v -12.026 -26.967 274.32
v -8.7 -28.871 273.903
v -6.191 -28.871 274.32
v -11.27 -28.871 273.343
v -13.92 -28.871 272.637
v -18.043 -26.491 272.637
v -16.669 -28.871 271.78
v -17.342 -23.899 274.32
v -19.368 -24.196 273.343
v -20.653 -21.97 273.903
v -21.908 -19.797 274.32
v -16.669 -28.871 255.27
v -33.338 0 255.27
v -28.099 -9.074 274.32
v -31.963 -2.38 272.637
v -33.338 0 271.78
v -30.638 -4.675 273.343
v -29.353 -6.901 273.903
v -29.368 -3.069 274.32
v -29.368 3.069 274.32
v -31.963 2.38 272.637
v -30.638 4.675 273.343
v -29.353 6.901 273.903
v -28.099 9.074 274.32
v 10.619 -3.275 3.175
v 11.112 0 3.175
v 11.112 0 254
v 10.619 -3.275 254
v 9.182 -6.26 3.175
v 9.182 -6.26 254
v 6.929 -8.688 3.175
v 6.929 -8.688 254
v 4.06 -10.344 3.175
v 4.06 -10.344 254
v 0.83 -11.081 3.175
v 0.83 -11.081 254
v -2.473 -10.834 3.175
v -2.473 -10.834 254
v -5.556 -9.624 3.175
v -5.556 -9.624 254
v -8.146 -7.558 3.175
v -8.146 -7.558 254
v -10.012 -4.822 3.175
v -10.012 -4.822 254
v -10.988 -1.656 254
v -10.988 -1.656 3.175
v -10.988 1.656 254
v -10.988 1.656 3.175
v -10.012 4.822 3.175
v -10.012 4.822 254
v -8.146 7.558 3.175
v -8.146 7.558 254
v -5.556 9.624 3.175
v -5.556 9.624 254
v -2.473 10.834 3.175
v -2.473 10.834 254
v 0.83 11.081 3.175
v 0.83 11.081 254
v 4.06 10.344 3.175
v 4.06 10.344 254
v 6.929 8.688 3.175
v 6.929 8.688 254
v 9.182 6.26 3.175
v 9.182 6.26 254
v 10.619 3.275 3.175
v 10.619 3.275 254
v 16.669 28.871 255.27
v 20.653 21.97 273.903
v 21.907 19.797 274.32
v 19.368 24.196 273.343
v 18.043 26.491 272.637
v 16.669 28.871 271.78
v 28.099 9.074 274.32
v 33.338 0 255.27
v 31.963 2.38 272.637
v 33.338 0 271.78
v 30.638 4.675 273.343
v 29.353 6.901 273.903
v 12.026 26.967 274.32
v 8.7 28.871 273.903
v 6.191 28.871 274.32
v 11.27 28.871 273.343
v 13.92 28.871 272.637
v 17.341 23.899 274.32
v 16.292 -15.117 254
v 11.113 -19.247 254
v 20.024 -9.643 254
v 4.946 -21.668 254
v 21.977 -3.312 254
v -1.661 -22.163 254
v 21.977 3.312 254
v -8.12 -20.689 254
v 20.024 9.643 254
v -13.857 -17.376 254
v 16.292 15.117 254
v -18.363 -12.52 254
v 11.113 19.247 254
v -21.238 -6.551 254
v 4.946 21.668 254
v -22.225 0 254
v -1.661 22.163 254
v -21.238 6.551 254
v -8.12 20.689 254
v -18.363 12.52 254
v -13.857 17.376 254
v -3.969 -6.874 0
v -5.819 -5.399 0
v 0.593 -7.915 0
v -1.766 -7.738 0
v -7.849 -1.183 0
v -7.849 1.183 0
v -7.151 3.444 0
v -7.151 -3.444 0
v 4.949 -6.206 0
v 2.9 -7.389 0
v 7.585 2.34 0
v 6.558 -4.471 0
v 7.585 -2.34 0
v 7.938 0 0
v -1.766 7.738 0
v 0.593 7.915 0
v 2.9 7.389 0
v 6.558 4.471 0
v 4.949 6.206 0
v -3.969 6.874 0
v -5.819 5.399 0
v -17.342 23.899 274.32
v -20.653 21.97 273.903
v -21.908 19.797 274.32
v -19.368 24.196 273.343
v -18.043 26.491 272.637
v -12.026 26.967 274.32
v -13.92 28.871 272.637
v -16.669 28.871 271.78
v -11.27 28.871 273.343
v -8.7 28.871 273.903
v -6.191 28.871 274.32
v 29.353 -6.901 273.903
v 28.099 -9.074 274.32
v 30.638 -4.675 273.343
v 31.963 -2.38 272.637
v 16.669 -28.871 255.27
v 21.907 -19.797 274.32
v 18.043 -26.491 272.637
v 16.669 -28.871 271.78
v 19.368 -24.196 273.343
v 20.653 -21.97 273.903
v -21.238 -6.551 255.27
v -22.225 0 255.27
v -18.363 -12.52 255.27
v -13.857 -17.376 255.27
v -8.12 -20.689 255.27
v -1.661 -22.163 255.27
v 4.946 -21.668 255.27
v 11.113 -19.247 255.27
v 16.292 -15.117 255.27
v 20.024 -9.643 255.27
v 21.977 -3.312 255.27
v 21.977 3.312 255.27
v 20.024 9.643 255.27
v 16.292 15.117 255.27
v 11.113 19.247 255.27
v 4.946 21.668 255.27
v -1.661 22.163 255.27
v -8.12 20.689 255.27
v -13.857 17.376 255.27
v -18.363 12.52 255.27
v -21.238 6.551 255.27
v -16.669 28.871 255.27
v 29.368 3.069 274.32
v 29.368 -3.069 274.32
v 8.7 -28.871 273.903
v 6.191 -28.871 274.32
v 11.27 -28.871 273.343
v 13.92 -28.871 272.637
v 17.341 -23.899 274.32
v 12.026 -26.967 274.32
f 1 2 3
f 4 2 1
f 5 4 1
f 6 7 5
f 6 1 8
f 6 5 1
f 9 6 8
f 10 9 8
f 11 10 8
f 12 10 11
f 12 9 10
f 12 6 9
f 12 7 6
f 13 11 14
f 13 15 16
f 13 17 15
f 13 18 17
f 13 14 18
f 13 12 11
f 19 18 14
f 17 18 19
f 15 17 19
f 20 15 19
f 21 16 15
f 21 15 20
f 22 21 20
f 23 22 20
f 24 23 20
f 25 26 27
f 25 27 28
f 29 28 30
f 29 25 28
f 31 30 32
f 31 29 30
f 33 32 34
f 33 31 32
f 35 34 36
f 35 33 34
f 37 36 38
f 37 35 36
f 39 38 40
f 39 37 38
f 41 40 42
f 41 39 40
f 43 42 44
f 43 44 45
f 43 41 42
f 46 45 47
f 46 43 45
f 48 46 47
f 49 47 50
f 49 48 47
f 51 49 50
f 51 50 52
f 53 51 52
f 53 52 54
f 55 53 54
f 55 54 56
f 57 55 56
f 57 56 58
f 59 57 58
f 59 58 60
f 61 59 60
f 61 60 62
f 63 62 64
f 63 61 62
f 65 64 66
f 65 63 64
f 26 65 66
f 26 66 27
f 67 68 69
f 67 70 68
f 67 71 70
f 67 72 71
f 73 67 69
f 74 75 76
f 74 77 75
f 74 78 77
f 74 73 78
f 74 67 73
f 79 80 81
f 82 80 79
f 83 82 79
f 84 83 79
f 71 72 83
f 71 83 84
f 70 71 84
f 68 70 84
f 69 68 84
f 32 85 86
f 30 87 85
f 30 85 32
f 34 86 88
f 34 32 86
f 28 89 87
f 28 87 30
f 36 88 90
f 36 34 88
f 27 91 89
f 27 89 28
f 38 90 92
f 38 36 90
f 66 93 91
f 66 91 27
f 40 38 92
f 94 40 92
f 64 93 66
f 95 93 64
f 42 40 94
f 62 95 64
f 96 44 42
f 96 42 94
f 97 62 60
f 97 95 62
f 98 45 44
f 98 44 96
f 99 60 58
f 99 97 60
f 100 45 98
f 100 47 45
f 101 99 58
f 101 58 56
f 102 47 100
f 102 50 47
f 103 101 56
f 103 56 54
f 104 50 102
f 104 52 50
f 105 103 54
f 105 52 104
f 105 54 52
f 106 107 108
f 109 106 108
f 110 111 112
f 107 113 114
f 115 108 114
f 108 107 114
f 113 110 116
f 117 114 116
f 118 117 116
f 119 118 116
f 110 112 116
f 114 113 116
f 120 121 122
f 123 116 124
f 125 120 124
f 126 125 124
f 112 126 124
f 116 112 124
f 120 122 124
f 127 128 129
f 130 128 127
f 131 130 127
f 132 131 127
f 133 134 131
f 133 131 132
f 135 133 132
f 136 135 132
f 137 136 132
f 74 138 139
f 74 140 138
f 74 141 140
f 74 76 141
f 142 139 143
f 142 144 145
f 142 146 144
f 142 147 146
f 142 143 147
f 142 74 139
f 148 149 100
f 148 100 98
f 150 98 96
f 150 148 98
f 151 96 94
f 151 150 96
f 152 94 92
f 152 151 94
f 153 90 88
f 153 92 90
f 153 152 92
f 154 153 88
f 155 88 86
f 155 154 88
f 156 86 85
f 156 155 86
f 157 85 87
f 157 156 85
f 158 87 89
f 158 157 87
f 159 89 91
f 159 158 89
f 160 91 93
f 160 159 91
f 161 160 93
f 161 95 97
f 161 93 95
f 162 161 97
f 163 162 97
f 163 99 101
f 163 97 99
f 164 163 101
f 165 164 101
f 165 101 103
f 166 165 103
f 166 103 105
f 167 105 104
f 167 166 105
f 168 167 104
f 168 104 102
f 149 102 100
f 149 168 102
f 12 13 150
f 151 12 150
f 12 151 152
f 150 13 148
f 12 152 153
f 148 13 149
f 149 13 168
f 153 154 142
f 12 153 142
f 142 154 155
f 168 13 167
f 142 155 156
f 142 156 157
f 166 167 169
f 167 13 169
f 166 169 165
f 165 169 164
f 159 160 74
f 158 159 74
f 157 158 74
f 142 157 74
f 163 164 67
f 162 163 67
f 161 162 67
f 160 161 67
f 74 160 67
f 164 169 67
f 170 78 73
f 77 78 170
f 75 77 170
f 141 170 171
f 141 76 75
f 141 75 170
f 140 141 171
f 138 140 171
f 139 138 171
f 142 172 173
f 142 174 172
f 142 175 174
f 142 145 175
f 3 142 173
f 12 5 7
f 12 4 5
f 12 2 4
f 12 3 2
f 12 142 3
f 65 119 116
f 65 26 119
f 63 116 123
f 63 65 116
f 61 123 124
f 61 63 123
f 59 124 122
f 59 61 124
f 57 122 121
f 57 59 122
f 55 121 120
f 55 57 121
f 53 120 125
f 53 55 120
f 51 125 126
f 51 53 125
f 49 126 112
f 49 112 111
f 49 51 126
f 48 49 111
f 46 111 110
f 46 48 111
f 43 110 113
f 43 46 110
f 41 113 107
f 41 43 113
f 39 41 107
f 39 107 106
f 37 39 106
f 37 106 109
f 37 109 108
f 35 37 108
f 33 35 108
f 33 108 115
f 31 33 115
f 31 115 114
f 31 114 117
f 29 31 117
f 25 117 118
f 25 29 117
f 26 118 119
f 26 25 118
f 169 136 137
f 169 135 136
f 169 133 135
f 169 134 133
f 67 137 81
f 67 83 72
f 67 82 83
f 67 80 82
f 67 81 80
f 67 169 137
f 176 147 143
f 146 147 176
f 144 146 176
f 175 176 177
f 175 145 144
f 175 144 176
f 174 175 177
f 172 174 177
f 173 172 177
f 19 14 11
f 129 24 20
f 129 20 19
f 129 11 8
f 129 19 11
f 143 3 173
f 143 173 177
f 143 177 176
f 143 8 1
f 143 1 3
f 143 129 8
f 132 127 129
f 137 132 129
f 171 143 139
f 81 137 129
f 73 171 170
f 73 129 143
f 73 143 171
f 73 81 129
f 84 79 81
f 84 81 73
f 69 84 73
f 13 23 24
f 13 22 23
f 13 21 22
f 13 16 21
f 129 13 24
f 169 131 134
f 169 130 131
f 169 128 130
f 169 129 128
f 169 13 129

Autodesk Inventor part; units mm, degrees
ref_plane "YZ Plane" through (0, 0, 0) normal (1, 0, 0) x (0, 1, 0)
ref_plane "XZ Plane" through (0, 0, 0) normal (0, 1, 0) x (-1, 0, 0)
ref_plane "XY Plane" through (0, 0, 0) normal (0, 0, 1) x (1, 0, 0)
sketch "Sketch1" plane through (0, 0, 0) normal (0, 0, 1) x (1, 0, 0)
  circle A0 centre (0, 0) radius 11.1125
  dimension "d0" = 22.225
extrude "Extrusion1" add sketch "Sketch1" along normal blind 255.27
sketch "Sketch2" plane through (0, 0, 255.27) normal (0, 0, 1) x (1, 0, 0)
  line L0 (16.6687, 28.8711) -> (33.3375, 0)
  line L1 (33.3375, 0) -> (16.6687, -28.8711)
  line L2 (16.6687, -28.8711) -> (-16.6688, -28.8711)
  line L3 (-16.6688, -28.8711) -> (-33.3375, 0)
  line L4 (-33.3375, 0) -> (-16.6688, 28.8711)
  line L5 (-16.6688, 28.8711) -> (16.6687, 28.8711)
  circle A0 centre (0, 0) radius 11.1125 construction
  dimension "d3" = 33.3375
  dimension "d6" = 22.225
extrude "Extrusion2" add sketch "Sketch2" along normal blind 19.05
sketch "Sketch3" plane through (0, 0, 0) normal (0, 1, 0) x (-1, 0, 0)
  line L0 (33.3375, 274.32) -> (16.6687, 274.32) projected
  line L1 (29.5275, 274.32) -> (33.3375, 271.78)
  line L2 (33.3375, 271.78) -> (33.3375, 274.32)
  line L3 (33.3375, 274.32) -> (29.5275, 274.32)
  line L4 (0, -55.626) -> (0, 333.756) projected
  point P0 (0, 0)
  dimension "d7" = 2.54
  dimension "d8" = 3.81
revolve "Revolution1" cut sketch "Sketch3" angle 360 about axis through (0, 0, -10) along (0, 0, 1)
sketch "Sketch4" plane through (0, 0, 255.27) normal (0, 0, -1) x (-1, 0, 0)
  circle A0 centre (0, 0) radius 22.225
  dimension "d10" = 44.45
extrude "Extrusion3" add sketch "Sketch4" along normal blind 1.27
chamfer "Chamfer1" distance 3.175 angle 45 1 edges at (-11.1125, 0, 0)
thread "Thread1" size "7/8-9 UNC" class "2A" standard "ANSI Unified Screw Threads" full length
equation "\"d3\" = 1.5 * d6"
properties part number "HexBoltAJB" material "Iron, Malleable"
